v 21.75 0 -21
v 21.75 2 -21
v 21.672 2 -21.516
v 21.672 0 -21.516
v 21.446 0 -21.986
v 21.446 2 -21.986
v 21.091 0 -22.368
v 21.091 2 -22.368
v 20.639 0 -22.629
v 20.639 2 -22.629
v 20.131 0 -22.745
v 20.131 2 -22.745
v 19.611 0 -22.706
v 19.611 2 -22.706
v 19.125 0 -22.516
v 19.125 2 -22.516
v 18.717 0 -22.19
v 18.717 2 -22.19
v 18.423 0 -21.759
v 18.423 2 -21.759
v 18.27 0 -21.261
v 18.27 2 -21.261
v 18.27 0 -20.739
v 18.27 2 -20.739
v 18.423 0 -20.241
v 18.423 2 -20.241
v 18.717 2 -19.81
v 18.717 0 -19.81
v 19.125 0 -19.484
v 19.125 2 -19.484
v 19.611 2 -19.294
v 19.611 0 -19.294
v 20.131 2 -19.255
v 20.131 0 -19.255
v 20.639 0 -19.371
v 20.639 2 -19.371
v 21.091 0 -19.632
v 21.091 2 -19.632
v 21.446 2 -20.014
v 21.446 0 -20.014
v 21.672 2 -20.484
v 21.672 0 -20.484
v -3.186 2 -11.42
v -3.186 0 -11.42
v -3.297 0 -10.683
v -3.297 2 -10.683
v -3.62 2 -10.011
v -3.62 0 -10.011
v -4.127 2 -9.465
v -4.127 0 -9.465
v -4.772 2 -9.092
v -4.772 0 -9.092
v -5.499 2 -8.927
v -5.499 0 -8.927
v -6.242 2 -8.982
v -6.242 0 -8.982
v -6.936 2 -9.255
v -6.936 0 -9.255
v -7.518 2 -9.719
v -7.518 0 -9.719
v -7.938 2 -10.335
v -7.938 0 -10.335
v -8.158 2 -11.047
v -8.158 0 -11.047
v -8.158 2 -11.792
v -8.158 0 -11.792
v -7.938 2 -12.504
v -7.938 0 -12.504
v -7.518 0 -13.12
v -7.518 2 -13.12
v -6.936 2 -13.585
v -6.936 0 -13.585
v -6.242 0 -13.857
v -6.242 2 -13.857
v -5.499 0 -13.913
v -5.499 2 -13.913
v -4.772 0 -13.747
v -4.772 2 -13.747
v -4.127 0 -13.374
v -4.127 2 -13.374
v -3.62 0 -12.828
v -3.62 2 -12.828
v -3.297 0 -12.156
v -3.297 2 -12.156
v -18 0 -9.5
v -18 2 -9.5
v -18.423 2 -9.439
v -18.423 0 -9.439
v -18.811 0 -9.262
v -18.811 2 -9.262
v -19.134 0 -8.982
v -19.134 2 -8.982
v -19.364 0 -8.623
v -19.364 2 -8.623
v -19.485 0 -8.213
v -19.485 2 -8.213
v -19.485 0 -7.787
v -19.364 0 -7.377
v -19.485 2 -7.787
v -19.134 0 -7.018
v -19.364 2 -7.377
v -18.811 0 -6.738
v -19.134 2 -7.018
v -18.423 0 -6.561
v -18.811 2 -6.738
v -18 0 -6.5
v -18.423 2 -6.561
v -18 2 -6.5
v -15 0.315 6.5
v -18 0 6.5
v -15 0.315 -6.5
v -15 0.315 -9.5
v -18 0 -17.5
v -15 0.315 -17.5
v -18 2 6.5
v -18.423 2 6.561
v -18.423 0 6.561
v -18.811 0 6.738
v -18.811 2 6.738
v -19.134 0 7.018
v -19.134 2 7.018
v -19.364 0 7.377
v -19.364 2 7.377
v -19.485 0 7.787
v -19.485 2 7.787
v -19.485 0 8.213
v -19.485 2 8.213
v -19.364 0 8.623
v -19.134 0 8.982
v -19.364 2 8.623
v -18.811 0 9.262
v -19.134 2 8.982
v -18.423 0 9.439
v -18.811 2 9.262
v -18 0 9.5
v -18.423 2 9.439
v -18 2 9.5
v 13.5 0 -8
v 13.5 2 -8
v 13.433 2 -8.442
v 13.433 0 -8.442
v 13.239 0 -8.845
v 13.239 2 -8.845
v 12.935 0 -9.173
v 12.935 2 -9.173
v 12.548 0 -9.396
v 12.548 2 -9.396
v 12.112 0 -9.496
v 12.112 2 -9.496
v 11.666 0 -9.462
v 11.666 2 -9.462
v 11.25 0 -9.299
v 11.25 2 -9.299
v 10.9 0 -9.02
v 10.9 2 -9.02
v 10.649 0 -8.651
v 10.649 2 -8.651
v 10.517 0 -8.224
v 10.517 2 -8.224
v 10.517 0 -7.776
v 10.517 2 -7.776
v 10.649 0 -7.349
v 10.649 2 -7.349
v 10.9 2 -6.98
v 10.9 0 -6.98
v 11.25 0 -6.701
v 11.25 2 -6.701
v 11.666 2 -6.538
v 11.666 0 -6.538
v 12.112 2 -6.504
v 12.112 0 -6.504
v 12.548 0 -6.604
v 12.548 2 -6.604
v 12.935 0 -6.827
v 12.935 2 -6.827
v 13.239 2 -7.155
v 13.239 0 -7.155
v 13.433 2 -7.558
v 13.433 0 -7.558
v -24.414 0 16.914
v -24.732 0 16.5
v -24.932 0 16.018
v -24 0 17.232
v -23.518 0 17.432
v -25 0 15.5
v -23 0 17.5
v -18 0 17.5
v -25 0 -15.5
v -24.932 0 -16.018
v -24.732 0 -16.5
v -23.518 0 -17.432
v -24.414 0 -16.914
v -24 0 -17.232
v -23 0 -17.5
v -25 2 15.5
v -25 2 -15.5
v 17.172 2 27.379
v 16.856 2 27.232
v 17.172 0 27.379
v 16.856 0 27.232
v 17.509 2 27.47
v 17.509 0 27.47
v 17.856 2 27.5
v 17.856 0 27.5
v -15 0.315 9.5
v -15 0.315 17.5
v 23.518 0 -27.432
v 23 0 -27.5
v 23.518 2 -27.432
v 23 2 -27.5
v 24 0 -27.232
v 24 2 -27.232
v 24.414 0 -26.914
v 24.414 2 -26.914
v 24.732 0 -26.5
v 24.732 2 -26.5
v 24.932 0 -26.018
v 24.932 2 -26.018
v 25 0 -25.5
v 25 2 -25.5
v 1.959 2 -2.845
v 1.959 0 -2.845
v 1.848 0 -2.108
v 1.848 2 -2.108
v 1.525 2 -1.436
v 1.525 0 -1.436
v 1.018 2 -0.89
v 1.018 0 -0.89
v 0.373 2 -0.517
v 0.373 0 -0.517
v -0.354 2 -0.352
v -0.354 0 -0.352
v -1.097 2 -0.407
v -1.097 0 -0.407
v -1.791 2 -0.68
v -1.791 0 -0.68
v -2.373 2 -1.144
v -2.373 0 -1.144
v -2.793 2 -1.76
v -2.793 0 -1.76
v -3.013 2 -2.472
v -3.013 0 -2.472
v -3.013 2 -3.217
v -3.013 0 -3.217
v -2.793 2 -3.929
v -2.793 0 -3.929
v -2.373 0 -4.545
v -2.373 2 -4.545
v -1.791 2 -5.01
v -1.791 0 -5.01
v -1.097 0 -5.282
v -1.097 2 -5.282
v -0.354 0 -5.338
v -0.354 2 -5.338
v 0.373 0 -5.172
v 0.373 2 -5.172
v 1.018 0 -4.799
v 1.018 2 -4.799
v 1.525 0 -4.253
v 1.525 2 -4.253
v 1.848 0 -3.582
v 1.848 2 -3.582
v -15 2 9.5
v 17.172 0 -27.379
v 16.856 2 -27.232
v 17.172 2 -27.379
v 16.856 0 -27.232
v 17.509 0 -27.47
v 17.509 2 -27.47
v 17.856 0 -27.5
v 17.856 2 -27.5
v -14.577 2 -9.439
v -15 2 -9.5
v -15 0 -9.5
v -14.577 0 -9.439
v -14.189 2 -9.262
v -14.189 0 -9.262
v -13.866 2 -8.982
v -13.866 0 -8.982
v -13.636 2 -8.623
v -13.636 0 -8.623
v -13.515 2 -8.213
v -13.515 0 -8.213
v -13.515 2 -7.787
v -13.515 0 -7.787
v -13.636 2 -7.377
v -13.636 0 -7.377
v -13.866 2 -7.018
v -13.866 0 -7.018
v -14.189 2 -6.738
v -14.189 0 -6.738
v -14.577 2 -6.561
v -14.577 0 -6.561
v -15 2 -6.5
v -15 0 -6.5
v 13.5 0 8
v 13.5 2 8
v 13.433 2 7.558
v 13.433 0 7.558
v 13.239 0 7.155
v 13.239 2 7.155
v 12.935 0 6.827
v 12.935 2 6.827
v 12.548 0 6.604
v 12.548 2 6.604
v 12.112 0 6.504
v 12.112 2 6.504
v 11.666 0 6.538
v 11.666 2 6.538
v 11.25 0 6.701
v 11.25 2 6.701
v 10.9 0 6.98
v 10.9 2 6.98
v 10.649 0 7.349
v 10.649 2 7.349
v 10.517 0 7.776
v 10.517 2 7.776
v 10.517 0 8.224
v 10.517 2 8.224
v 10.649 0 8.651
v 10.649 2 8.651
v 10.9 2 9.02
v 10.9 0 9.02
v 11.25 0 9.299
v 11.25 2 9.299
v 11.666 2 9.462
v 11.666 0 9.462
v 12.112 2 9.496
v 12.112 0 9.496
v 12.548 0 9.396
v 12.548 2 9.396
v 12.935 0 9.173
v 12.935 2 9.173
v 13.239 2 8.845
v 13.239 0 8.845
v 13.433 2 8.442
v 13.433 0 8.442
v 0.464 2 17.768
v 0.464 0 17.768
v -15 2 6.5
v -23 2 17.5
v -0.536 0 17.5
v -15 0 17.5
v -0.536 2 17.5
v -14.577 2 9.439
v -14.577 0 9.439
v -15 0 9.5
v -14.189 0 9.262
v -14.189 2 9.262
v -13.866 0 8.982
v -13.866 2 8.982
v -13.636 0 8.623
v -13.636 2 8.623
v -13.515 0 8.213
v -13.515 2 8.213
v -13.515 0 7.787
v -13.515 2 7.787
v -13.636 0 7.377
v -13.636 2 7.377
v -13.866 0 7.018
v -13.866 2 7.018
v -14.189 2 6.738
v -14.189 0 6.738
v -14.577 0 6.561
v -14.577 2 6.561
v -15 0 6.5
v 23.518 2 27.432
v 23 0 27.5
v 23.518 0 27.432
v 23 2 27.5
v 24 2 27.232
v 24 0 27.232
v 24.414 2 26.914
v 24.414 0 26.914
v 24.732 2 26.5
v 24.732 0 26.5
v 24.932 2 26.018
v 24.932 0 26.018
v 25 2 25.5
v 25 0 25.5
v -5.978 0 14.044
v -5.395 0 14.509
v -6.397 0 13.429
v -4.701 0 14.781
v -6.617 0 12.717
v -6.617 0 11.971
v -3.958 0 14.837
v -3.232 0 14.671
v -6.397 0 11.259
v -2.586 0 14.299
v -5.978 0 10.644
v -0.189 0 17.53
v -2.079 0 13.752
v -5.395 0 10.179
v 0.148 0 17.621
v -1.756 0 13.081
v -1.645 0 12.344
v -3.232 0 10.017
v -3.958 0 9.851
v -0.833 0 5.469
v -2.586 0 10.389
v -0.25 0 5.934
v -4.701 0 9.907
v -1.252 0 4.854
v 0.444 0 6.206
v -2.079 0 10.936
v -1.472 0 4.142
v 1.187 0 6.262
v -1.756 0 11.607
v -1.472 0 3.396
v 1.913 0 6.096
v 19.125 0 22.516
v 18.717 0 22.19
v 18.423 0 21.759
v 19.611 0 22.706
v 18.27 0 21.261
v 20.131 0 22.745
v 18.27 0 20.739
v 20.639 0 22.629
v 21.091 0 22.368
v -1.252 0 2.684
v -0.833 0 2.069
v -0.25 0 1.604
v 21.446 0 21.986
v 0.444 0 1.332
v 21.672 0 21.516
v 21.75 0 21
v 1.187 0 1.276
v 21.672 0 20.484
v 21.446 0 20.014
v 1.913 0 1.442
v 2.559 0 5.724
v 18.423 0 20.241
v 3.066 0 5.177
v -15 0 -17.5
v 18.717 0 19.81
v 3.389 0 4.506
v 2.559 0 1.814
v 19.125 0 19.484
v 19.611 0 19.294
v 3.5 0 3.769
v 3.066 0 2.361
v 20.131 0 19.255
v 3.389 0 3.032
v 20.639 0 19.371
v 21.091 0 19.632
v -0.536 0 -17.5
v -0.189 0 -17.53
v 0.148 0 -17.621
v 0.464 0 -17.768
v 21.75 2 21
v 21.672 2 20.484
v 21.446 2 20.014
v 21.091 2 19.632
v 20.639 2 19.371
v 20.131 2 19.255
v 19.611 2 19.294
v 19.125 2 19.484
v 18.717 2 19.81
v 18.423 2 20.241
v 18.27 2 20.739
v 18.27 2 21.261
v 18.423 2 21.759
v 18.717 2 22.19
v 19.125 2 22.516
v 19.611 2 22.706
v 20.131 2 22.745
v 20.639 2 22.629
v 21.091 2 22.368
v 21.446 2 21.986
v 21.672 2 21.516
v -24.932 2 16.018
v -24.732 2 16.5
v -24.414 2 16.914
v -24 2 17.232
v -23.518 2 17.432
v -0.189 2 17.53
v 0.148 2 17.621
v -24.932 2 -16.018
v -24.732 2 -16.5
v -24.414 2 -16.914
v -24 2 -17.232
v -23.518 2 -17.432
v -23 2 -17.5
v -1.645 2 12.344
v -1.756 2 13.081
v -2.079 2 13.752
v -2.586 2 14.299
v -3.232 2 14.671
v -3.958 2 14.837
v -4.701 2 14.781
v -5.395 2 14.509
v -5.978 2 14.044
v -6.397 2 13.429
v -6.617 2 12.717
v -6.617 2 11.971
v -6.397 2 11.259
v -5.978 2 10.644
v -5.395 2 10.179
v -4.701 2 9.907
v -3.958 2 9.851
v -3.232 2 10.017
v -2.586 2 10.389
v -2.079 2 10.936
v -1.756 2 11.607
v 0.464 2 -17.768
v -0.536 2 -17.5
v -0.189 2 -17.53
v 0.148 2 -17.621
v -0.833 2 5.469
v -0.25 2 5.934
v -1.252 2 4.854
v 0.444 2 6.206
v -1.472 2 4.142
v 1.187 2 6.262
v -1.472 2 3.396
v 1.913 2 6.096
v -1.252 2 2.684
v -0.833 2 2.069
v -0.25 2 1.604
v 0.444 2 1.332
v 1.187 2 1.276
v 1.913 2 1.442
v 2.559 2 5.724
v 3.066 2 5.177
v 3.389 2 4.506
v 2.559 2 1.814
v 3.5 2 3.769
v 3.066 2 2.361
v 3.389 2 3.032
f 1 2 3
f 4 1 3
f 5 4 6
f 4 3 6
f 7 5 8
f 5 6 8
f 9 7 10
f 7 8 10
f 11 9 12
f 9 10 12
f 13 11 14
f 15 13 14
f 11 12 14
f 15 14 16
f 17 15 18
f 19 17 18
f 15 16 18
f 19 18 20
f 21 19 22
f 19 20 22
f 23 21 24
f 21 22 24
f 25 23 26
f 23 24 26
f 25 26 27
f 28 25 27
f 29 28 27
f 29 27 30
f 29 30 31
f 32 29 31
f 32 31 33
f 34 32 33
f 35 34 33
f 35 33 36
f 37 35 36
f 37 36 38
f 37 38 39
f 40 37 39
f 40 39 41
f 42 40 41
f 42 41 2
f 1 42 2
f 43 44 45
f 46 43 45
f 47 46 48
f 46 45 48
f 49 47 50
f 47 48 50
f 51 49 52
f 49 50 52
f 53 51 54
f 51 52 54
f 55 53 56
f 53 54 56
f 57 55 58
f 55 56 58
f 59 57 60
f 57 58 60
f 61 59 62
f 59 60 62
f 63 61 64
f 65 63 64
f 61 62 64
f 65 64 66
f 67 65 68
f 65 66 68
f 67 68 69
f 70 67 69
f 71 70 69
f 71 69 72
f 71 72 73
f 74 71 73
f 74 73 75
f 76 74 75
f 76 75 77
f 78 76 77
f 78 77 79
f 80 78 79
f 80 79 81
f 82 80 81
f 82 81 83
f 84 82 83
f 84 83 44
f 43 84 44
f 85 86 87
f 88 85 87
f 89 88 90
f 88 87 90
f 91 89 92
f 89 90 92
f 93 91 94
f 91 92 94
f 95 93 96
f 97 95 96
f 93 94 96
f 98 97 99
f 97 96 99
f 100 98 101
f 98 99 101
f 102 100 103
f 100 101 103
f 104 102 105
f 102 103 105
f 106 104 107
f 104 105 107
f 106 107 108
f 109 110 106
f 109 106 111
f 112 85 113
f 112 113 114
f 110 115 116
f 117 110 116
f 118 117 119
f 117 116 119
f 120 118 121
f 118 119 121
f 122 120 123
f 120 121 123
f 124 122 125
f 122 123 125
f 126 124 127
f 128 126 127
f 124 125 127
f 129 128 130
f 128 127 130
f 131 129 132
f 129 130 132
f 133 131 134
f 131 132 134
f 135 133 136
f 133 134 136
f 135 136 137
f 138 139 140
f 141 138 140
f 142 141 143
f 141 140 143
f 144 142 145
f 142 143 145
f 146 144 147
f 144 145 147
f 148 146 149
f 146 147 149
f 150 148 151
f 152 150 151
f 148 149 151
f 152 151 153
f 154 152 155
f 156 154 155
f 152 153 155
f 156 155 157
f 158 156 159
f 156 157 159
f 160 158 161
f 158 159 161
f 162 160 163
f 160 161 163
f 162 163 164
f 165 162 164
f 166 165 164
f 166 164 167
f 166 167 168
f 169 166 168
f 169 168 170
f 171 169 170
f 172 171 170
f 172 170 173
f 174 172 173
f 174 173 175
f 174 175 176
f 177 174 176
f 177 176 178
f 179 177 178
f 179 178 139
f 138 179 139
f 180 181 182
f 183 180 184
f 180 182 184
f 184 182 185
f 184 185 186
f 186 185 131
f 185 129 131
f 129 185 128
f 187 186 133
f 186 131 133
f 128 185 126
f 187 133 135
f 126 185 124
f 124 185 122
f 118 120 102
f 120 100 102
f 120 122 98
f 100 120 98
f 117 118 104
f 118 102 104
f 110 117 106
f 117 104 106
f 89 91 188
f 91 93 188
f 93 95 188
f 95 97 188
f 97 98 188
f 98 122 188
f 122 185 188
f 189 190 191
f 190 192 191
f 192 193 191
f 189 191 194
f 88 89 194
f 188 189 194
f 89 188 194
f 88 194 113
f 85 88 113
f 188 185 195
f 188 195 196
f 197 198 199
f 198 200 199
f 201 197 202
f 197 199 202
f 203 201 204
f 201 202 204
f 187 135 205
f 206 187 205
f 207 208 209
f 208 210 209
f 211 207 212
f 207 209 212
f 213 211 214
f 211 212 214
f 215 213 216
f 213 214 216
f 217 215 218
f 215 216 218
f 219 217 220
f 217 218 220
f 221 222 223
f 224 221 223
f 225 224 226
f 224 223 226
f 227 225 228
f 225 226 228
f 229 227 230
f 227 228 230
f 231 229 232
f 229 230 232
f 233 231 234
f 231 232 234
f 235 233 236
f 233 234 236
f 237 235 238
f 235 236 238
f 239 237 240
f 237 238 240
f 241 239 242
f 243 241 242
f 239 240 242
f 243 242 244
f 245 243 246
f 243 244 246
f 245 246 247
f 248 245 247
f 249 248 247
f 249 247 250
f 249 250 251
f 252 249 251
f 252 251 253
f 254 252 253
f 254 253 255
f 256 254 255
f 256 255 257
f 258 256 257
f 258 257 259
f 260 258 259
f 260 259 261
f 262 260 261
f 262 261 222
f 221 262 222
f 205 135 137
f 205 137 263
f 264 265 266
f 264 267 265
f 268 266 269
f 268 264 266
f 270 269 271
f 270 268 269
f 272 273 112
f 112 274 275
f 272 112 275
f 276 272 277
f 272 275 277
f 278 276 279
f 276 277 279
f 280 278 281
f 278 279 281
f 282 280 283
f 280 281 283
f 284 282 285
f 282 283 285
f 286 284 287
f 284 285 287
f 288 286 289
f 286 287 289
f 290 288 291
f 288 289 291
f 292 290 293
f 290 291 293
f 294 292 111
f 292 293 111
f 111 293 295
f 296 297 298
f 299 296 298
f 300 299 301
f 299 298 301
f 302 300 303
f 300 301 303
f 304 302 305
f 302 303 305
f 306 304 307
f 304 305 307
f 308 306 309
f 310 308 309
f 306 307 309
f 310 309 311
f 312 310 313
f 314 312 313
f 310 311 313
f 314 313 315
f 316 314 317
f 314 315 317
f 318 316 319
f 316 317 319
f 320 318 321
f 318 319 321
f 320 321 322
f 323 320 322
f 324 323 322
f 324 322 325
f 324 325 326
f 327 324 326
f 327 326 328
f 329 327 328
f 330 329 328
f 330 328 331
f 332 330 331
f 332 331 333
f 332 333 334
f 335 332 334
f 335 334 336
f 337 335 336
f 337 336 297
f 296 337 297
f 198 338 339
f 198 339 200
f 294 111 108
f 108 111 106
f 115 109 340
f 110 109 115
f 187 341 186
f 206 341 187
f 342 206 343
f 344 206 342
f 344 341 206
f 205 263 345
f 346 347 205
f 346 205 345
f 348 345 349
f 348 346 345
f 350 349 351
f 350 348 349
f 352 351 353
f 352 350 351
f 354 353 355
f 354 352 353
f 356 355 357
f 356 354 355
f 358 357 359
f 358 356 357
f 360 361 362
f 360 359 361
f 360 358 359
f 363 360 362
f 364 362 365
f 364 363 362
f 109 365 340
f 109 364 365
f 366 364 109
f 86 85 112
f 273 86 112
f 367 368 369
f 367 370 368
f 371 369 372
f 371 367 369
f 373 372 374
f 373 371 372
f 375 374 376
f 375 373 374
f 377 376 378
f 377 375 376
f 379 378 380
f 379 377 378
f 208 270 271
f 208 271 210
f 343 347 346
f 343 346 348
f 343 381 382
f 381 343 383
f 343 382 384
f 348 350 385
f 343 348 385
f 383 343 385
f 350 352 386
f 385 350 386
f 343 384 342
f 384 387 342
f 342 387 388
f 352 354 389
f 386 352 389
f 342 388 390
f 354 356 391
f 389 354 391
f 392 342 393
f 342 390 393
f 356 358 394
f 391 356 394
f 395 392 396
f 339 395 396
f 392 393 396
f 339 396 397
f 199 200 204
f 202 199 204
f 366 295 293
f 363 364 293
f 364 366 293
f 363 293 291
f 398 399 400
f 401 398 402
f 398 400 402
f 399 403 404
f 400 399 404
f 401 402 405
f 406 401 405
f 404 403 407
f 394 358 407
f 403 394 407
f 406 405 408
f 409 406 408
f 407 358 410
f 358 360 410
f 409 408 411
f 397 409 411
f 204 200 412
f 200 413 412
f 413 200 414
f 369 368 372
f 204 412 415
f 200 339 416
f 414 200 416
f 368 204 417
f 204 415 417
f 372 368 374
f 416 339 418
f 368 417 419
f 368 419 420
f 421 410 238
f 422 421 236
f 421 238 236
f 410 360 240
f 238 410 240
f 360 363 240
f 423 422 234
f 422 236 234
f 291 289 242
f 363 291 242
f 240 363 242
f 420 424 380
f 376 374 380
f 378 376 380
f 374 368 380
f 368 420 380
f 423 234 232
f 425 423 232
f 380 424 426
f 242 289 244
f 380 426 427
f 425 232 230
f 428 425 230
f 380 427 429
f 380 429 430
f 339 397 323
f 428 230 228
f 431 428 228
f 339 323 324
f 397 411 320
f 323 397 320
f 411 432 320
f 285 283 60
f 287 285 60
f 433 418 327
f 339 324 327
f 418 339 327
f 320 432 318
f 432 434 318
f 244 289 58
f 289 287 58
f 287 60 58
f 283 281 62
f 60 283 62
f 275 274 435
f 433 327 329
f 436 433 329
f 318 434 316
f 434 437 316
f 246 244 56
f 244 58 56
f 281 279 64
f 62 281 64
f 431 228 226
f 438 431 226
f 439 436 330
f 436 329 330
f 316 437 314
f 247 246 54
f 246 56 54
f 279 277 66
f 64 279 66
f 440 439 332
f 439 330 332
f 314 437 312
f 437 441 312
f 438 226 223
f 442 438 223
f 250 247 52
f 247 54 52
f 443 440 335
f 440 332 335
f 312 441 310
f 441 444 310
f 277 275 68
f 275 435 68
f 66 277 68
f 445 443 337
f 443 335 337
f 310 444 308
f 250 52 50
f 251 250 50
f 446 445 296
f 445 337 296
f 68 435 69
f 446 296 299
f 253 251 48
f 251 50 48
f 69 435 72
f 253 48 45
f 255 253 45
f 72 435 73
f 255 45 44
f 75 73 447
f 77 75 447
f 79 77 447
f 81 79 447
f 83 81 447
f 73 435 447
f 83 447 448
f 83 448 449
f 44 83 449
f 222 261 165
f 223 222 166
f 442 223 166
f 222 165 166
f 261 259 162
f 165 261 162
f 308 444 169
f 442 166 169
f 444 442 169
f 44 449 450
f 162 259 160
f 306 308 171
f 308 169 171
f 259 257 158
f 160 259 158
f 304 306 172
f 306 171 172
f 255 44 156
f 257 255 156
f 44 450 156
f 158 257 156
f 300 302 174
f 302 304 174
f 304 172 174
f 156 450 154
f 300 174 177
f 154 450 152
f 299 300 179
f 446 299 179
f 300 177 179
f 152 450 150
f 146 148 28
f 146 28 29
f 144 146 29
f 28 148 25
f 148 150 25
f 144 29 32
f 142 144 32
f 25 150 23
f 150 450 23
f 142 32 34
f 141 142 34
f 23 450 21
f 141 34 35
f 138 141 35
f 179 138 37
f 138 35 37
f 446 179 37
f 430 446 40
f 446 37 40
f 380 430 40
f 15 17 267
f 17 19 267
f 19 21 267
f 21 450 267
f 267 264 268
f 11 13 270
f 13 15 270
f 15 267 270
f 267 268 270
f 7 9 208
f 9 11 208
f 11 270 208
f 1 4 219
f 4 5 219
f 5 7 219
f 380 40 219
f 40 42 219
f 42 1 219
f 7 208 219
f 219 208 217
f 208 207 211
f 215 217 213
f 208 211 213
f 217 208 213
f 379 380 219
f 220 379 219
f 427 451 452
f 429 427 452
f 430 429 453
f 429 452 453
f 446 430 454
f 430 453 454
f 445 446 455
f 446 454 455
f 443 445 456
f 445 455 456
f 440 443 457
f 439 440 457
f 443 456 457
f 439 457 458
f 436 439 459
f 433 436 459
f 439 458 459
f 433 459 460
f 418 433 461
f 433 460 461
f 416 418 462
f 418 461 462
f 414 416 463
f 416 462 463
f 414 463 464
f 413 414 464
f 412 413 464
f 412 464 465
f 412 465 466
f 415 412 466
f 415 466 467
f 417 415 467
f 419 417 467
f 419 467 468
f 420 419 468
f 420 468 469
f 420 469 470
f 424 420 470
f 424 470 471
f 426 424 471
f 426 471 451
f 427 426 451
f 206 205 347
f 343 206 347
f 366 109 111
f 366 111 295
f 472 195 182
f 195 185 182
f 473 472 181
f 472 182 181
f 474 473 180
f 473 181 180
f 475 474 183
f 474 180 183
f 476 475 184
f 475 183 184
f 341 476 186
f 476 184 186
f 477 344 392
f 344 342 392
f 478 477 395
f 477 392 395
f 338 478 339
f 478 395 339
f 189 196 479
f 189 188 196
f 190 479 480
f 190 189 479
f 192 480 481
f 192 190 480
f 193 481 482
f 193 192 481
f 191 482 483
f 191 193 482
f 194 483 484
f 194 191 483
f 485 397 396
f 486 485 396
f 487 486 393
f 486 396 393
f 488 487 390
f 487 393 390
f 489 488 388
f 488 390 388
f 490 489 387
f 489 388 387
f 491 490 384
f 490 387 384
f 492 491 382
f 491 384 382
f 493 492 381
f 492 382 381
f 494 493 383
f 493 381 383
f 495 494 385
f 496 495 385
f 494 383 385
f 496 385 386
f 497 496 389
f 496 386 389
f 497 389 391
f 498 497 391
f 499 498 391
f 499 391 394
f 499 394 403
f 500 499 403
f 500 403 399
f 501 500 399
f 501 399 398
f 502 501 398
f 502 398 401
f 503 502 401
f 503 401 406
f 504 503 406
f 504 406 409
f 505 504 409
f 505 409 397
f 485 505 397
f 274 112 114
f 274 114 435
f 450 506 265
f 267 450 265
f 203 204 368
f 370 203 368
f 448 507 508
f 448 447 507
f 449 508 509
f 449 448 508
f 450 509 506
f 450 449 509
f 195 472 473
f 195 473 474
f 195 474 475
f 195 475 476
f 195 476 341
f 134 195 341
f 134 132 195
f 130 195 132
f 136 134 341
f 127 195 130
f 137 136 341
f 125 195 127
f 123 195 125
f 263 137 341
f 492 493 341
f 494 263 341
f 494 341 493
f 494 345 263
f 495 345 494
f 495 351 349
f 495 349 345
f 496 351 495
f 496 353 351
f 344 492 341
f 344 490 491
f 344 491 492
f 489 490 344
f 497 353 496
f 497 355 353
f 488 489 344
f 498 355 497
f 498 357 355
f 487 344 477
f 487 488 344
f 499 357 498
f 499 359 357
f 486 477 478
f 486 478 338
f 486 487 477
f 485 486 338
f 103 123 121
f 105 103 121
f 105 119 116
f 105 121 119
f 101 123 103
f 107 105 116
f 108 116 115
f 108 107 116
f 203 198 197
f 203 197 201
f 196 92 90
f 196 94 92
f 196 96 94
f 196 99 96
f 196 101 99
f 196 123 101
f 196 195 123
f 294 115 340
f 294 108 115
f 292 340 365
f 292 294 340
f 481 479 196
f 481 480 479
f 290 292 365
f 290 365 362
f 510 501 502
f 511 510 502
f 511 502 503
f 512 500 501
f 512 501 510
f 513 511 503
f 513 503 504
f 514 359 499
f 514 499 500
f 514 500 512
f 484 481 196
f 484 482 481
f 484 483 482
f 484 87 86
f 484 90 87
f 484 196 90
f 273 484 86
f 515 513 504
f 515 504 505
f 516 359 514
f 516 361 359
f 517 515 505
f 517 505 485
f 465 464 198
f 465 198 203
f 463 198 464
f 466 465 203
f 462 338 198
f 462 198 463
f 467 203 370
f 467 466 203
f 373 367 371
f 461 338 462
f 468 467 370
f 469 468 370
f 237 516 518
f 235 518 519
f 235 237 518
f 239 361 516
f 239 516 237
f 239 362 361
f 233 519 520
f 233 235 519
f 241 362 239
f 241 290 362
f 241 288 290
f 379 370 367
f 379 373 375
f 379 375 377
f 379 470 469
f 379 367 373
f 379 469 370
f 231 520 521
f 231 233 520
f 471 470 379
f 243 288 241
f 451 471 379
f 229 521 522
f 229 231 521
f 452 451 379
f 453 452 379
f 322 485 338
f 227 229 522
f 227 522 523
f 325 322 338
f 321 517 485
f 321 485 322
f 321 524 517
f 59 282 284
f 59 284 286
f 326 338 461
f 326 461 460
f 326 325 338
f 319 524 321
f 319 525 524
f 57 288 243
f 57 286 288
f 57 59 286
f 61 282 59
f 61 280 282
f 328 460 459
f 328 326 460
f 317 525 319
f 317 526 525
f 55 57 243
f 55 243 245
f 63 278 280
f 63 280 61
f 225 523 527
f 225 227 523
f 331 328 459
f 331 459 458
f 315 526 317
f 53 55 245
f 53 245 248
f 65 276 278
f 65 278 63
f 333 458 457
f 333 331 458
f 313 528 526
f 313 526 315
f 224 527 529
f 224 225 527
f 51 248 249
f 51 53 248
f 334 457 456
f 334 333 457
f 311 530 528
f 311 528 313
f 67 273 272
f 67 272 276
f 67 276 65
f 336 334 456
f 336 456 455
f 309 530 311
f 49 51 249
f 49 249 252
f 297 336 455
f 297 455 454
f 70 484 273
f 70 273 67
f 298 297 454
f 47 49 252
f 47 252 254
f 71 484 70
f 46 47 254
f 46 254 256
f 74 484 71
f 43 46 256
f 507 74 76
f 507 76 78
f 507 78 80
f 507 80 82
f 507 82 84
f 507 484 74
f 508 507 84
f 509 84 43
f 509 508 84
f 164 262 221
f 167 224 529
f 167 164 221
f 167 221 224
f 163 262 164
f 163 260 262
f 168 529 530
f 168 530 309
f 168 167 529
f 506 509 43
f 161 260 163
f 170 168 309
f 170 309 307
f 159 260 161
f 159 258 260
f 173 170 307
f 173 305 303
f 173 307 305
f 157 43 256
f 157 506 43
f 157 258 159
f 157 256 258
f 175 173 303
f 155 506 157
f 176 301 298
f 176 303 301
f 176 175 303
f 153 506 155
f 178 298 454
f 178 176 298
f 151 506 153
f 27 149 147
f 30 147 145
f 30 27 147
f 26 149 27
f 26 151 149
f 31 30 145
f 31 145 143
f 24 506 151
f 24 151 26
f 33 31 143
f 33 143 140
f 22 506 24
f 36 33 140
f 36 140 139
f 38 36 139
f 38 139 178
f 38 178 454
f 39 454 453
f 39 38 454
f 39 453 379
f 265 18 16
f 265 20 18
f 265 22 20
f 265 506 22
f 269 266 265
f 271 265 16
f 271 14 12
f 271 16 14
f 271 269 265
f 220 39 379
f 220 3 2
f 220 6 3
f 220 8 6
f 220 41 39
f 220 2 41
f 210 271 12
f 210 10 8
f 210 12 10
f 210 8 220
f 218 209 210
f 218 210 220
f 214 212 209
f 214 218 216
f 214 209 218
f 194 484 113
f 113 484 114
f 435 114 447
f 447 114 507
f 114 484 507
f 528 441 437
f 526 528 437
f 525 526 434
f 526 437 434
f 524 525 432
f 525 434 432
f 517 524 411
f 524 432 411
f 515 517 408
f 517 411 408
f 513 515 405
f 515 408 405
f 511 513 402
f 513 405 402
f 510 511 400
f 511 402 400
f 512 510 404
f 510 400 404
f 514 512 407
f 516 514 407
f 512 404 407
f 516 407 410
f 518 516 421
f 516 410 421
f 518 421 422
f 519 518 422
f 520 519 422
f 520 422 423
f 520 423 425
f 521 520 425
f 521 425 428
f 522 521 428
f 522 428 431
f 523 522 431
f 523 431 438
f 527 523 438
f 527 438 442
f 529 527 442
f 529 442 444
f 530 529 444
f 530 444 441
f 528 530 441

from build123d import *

# Parameters (mm, degrees)
SKETCH_1_W               = 50
SKETCH_1_H               = 55
EXTRUDE_1_DEPTH          = 2
SKETCH_2_R               = 1.5
CUT_EXTRUDE_1_DEPTH      = 3
CUT_EXTRUDE_2_DEPTH      = 10
CUT_EXTRUDE_3_DEPTH      = 20.5
CUT_EXTRUDE_3_DEPTH_BACK = 36.5
SKETCH_5_R               = 1.75
CUT_EXTRUDE_4_DEPTH      = 10
CUT_EXTRUDE_5_DEPTH      = 10
SKETCH_7_R               = 2.5
CUT_EXTRUDE_6_DEPTH      = 10
FILLET_1_R               = 2


with BuildPart() as part:
    # 草图1 → 凸台-拉伸1 (new body)
    with BuildSketch(Plane(origin=(0, 0, 0), x_dir=(1, 0, 0), z_dir=(0, 1, 0))):
        Rectangle(SKETCH_1_W, SKETCH_1_H)
    extrude(amount=EXTRUDE_1_DEPTH)

    # 草图2 → 切除-拉伸1 (cut, through all)
    with BuildSketch(Plane(origin=(0, 2, 0), x_dir=(1, 0, 0), z_dir=(0, 1, 0))):
        with Locations((-18, 8)):
            Circle(SKETCH_2_R)
        with Locations((-18, -8)):
            Circle(SKETCH_2_R)
        with Locations((12, -8)):
            Circle(SKETCH_2_R)
        with Locations((12, 8)):
            Circle(SKETCH_2_R)
    extrude(amount=-CUT_EXTRUDE_1_DEPTH, mode=Mode.SUBTRACT)

    # 草图3 → 切除-拉伸2 (cut)
    with BuildSketch(Plane.XZ):
        with BuildLine():
            Line((-18, 9.5), (-15, 9.5))
            ThreePointArc((-15, 9.5), (-13.5, 8), (-15, 6.5))
            Line((-15, 6.5), (-18, 6.5))
            Line((-18, 6.5), (-18, 9.5))
        make_face()
    cut_extrude_2 = extrude(amount=-CUT_EXTRUDE_2_DEPTH, mode=Mode.SUBTRACT)

    # 草图4 → 切除-拉伸3 (cut, two sides)
    with BuildSketch(Plane.XY.offset(8)) as cut_extrude_3_sk:
        Polygon((-18, 0), (-15, 0.315312706), (-15, 0), align=None)
    extrude(amount=CUT_EXTRUDE_3_DEPTH, mode=Mode.SUBTRACT)
    extrude(cut_extrude_3_sk.sketch, amount=-CUT_EXTRUDE_3_DEPTH_BACK, mode=Mode.SUBTRACT)

    # 镜向1: 切除-拉伸2 across plane
    add(cut_extrude_2.mirror(Plane.XY), mode=Mode.SUBTRACT)

    # 草图5 → 切除-拉伸4 (cut)
    with BuildSketch(Plane(origin=(0, 2, 0), x_dir=(1, 0, 0), z_dir=(0, 1, 0))):
        with Locations((20, 21)):
            Circle(SKETCH_5_R)
        with Locations((20, -21)):
            Circle(SKETCH_5_R)
    extrude(amount=-CUT_EXTRUDE_4_DEPTH, mode=Mode.SUBTRACT)

    # 草图6 → 切除-拉伸5 (cut)
    with BuildSketch(Plane(origin=(0, 2, 0), x_dir=(1, 0, 0), z_dir=(0, 1, 0))):
        Polygon((-25, 17.5), (0, 17.5), (17.320508076, 27.5), (-25, 27.5), align=None)
        Polygon((17.320508076, -27.5), (-25, -27.5), (-25, -17.5), (0, -17.5), align=None)
    extrude(amount=-CUT_EXTRUDE_5_DEPTH, mode=Mode.SUBTRACT)

    # 草图7 → 切除-拉伸6 (cut)
    with BuildSketch(Plane.XZ):
        with Locations((-5.685574087, -11.419607443)):
            Circle(SKETCH_7_R)
        with Locations((-0.540616532, -2.844678186)):
            Circle(SKETCH_7_R)
        with Locations((-4.144957554, 12.343977362)):
            Circle(SKETCH_7_R)
        with Locations((1, 3.769048105)):
            Circle(SKETCH_7_R)
    extrude(amount=-CUT_EXTRUDE_6_DEPTH, mode=Mode.SUBTRACT)

    # 圆角1
    fillet_1_edges = [part.edges().sort_by_distance(p)[0] for p in [
        (17.320508076, 1, -27.5),
        (-25, 1, -17.5),
        (0, 1, -17.5),
        (0, 1, 17.5),
        (17.320508076, 1, 27.5),
        (-25, 1, 17.5),
        (25, 1, 27.5),
        (25, 1, -27.5),
    ]]
    fillet(fillet_1_edges, radius=FILLET_1_R)


solid = part.part
